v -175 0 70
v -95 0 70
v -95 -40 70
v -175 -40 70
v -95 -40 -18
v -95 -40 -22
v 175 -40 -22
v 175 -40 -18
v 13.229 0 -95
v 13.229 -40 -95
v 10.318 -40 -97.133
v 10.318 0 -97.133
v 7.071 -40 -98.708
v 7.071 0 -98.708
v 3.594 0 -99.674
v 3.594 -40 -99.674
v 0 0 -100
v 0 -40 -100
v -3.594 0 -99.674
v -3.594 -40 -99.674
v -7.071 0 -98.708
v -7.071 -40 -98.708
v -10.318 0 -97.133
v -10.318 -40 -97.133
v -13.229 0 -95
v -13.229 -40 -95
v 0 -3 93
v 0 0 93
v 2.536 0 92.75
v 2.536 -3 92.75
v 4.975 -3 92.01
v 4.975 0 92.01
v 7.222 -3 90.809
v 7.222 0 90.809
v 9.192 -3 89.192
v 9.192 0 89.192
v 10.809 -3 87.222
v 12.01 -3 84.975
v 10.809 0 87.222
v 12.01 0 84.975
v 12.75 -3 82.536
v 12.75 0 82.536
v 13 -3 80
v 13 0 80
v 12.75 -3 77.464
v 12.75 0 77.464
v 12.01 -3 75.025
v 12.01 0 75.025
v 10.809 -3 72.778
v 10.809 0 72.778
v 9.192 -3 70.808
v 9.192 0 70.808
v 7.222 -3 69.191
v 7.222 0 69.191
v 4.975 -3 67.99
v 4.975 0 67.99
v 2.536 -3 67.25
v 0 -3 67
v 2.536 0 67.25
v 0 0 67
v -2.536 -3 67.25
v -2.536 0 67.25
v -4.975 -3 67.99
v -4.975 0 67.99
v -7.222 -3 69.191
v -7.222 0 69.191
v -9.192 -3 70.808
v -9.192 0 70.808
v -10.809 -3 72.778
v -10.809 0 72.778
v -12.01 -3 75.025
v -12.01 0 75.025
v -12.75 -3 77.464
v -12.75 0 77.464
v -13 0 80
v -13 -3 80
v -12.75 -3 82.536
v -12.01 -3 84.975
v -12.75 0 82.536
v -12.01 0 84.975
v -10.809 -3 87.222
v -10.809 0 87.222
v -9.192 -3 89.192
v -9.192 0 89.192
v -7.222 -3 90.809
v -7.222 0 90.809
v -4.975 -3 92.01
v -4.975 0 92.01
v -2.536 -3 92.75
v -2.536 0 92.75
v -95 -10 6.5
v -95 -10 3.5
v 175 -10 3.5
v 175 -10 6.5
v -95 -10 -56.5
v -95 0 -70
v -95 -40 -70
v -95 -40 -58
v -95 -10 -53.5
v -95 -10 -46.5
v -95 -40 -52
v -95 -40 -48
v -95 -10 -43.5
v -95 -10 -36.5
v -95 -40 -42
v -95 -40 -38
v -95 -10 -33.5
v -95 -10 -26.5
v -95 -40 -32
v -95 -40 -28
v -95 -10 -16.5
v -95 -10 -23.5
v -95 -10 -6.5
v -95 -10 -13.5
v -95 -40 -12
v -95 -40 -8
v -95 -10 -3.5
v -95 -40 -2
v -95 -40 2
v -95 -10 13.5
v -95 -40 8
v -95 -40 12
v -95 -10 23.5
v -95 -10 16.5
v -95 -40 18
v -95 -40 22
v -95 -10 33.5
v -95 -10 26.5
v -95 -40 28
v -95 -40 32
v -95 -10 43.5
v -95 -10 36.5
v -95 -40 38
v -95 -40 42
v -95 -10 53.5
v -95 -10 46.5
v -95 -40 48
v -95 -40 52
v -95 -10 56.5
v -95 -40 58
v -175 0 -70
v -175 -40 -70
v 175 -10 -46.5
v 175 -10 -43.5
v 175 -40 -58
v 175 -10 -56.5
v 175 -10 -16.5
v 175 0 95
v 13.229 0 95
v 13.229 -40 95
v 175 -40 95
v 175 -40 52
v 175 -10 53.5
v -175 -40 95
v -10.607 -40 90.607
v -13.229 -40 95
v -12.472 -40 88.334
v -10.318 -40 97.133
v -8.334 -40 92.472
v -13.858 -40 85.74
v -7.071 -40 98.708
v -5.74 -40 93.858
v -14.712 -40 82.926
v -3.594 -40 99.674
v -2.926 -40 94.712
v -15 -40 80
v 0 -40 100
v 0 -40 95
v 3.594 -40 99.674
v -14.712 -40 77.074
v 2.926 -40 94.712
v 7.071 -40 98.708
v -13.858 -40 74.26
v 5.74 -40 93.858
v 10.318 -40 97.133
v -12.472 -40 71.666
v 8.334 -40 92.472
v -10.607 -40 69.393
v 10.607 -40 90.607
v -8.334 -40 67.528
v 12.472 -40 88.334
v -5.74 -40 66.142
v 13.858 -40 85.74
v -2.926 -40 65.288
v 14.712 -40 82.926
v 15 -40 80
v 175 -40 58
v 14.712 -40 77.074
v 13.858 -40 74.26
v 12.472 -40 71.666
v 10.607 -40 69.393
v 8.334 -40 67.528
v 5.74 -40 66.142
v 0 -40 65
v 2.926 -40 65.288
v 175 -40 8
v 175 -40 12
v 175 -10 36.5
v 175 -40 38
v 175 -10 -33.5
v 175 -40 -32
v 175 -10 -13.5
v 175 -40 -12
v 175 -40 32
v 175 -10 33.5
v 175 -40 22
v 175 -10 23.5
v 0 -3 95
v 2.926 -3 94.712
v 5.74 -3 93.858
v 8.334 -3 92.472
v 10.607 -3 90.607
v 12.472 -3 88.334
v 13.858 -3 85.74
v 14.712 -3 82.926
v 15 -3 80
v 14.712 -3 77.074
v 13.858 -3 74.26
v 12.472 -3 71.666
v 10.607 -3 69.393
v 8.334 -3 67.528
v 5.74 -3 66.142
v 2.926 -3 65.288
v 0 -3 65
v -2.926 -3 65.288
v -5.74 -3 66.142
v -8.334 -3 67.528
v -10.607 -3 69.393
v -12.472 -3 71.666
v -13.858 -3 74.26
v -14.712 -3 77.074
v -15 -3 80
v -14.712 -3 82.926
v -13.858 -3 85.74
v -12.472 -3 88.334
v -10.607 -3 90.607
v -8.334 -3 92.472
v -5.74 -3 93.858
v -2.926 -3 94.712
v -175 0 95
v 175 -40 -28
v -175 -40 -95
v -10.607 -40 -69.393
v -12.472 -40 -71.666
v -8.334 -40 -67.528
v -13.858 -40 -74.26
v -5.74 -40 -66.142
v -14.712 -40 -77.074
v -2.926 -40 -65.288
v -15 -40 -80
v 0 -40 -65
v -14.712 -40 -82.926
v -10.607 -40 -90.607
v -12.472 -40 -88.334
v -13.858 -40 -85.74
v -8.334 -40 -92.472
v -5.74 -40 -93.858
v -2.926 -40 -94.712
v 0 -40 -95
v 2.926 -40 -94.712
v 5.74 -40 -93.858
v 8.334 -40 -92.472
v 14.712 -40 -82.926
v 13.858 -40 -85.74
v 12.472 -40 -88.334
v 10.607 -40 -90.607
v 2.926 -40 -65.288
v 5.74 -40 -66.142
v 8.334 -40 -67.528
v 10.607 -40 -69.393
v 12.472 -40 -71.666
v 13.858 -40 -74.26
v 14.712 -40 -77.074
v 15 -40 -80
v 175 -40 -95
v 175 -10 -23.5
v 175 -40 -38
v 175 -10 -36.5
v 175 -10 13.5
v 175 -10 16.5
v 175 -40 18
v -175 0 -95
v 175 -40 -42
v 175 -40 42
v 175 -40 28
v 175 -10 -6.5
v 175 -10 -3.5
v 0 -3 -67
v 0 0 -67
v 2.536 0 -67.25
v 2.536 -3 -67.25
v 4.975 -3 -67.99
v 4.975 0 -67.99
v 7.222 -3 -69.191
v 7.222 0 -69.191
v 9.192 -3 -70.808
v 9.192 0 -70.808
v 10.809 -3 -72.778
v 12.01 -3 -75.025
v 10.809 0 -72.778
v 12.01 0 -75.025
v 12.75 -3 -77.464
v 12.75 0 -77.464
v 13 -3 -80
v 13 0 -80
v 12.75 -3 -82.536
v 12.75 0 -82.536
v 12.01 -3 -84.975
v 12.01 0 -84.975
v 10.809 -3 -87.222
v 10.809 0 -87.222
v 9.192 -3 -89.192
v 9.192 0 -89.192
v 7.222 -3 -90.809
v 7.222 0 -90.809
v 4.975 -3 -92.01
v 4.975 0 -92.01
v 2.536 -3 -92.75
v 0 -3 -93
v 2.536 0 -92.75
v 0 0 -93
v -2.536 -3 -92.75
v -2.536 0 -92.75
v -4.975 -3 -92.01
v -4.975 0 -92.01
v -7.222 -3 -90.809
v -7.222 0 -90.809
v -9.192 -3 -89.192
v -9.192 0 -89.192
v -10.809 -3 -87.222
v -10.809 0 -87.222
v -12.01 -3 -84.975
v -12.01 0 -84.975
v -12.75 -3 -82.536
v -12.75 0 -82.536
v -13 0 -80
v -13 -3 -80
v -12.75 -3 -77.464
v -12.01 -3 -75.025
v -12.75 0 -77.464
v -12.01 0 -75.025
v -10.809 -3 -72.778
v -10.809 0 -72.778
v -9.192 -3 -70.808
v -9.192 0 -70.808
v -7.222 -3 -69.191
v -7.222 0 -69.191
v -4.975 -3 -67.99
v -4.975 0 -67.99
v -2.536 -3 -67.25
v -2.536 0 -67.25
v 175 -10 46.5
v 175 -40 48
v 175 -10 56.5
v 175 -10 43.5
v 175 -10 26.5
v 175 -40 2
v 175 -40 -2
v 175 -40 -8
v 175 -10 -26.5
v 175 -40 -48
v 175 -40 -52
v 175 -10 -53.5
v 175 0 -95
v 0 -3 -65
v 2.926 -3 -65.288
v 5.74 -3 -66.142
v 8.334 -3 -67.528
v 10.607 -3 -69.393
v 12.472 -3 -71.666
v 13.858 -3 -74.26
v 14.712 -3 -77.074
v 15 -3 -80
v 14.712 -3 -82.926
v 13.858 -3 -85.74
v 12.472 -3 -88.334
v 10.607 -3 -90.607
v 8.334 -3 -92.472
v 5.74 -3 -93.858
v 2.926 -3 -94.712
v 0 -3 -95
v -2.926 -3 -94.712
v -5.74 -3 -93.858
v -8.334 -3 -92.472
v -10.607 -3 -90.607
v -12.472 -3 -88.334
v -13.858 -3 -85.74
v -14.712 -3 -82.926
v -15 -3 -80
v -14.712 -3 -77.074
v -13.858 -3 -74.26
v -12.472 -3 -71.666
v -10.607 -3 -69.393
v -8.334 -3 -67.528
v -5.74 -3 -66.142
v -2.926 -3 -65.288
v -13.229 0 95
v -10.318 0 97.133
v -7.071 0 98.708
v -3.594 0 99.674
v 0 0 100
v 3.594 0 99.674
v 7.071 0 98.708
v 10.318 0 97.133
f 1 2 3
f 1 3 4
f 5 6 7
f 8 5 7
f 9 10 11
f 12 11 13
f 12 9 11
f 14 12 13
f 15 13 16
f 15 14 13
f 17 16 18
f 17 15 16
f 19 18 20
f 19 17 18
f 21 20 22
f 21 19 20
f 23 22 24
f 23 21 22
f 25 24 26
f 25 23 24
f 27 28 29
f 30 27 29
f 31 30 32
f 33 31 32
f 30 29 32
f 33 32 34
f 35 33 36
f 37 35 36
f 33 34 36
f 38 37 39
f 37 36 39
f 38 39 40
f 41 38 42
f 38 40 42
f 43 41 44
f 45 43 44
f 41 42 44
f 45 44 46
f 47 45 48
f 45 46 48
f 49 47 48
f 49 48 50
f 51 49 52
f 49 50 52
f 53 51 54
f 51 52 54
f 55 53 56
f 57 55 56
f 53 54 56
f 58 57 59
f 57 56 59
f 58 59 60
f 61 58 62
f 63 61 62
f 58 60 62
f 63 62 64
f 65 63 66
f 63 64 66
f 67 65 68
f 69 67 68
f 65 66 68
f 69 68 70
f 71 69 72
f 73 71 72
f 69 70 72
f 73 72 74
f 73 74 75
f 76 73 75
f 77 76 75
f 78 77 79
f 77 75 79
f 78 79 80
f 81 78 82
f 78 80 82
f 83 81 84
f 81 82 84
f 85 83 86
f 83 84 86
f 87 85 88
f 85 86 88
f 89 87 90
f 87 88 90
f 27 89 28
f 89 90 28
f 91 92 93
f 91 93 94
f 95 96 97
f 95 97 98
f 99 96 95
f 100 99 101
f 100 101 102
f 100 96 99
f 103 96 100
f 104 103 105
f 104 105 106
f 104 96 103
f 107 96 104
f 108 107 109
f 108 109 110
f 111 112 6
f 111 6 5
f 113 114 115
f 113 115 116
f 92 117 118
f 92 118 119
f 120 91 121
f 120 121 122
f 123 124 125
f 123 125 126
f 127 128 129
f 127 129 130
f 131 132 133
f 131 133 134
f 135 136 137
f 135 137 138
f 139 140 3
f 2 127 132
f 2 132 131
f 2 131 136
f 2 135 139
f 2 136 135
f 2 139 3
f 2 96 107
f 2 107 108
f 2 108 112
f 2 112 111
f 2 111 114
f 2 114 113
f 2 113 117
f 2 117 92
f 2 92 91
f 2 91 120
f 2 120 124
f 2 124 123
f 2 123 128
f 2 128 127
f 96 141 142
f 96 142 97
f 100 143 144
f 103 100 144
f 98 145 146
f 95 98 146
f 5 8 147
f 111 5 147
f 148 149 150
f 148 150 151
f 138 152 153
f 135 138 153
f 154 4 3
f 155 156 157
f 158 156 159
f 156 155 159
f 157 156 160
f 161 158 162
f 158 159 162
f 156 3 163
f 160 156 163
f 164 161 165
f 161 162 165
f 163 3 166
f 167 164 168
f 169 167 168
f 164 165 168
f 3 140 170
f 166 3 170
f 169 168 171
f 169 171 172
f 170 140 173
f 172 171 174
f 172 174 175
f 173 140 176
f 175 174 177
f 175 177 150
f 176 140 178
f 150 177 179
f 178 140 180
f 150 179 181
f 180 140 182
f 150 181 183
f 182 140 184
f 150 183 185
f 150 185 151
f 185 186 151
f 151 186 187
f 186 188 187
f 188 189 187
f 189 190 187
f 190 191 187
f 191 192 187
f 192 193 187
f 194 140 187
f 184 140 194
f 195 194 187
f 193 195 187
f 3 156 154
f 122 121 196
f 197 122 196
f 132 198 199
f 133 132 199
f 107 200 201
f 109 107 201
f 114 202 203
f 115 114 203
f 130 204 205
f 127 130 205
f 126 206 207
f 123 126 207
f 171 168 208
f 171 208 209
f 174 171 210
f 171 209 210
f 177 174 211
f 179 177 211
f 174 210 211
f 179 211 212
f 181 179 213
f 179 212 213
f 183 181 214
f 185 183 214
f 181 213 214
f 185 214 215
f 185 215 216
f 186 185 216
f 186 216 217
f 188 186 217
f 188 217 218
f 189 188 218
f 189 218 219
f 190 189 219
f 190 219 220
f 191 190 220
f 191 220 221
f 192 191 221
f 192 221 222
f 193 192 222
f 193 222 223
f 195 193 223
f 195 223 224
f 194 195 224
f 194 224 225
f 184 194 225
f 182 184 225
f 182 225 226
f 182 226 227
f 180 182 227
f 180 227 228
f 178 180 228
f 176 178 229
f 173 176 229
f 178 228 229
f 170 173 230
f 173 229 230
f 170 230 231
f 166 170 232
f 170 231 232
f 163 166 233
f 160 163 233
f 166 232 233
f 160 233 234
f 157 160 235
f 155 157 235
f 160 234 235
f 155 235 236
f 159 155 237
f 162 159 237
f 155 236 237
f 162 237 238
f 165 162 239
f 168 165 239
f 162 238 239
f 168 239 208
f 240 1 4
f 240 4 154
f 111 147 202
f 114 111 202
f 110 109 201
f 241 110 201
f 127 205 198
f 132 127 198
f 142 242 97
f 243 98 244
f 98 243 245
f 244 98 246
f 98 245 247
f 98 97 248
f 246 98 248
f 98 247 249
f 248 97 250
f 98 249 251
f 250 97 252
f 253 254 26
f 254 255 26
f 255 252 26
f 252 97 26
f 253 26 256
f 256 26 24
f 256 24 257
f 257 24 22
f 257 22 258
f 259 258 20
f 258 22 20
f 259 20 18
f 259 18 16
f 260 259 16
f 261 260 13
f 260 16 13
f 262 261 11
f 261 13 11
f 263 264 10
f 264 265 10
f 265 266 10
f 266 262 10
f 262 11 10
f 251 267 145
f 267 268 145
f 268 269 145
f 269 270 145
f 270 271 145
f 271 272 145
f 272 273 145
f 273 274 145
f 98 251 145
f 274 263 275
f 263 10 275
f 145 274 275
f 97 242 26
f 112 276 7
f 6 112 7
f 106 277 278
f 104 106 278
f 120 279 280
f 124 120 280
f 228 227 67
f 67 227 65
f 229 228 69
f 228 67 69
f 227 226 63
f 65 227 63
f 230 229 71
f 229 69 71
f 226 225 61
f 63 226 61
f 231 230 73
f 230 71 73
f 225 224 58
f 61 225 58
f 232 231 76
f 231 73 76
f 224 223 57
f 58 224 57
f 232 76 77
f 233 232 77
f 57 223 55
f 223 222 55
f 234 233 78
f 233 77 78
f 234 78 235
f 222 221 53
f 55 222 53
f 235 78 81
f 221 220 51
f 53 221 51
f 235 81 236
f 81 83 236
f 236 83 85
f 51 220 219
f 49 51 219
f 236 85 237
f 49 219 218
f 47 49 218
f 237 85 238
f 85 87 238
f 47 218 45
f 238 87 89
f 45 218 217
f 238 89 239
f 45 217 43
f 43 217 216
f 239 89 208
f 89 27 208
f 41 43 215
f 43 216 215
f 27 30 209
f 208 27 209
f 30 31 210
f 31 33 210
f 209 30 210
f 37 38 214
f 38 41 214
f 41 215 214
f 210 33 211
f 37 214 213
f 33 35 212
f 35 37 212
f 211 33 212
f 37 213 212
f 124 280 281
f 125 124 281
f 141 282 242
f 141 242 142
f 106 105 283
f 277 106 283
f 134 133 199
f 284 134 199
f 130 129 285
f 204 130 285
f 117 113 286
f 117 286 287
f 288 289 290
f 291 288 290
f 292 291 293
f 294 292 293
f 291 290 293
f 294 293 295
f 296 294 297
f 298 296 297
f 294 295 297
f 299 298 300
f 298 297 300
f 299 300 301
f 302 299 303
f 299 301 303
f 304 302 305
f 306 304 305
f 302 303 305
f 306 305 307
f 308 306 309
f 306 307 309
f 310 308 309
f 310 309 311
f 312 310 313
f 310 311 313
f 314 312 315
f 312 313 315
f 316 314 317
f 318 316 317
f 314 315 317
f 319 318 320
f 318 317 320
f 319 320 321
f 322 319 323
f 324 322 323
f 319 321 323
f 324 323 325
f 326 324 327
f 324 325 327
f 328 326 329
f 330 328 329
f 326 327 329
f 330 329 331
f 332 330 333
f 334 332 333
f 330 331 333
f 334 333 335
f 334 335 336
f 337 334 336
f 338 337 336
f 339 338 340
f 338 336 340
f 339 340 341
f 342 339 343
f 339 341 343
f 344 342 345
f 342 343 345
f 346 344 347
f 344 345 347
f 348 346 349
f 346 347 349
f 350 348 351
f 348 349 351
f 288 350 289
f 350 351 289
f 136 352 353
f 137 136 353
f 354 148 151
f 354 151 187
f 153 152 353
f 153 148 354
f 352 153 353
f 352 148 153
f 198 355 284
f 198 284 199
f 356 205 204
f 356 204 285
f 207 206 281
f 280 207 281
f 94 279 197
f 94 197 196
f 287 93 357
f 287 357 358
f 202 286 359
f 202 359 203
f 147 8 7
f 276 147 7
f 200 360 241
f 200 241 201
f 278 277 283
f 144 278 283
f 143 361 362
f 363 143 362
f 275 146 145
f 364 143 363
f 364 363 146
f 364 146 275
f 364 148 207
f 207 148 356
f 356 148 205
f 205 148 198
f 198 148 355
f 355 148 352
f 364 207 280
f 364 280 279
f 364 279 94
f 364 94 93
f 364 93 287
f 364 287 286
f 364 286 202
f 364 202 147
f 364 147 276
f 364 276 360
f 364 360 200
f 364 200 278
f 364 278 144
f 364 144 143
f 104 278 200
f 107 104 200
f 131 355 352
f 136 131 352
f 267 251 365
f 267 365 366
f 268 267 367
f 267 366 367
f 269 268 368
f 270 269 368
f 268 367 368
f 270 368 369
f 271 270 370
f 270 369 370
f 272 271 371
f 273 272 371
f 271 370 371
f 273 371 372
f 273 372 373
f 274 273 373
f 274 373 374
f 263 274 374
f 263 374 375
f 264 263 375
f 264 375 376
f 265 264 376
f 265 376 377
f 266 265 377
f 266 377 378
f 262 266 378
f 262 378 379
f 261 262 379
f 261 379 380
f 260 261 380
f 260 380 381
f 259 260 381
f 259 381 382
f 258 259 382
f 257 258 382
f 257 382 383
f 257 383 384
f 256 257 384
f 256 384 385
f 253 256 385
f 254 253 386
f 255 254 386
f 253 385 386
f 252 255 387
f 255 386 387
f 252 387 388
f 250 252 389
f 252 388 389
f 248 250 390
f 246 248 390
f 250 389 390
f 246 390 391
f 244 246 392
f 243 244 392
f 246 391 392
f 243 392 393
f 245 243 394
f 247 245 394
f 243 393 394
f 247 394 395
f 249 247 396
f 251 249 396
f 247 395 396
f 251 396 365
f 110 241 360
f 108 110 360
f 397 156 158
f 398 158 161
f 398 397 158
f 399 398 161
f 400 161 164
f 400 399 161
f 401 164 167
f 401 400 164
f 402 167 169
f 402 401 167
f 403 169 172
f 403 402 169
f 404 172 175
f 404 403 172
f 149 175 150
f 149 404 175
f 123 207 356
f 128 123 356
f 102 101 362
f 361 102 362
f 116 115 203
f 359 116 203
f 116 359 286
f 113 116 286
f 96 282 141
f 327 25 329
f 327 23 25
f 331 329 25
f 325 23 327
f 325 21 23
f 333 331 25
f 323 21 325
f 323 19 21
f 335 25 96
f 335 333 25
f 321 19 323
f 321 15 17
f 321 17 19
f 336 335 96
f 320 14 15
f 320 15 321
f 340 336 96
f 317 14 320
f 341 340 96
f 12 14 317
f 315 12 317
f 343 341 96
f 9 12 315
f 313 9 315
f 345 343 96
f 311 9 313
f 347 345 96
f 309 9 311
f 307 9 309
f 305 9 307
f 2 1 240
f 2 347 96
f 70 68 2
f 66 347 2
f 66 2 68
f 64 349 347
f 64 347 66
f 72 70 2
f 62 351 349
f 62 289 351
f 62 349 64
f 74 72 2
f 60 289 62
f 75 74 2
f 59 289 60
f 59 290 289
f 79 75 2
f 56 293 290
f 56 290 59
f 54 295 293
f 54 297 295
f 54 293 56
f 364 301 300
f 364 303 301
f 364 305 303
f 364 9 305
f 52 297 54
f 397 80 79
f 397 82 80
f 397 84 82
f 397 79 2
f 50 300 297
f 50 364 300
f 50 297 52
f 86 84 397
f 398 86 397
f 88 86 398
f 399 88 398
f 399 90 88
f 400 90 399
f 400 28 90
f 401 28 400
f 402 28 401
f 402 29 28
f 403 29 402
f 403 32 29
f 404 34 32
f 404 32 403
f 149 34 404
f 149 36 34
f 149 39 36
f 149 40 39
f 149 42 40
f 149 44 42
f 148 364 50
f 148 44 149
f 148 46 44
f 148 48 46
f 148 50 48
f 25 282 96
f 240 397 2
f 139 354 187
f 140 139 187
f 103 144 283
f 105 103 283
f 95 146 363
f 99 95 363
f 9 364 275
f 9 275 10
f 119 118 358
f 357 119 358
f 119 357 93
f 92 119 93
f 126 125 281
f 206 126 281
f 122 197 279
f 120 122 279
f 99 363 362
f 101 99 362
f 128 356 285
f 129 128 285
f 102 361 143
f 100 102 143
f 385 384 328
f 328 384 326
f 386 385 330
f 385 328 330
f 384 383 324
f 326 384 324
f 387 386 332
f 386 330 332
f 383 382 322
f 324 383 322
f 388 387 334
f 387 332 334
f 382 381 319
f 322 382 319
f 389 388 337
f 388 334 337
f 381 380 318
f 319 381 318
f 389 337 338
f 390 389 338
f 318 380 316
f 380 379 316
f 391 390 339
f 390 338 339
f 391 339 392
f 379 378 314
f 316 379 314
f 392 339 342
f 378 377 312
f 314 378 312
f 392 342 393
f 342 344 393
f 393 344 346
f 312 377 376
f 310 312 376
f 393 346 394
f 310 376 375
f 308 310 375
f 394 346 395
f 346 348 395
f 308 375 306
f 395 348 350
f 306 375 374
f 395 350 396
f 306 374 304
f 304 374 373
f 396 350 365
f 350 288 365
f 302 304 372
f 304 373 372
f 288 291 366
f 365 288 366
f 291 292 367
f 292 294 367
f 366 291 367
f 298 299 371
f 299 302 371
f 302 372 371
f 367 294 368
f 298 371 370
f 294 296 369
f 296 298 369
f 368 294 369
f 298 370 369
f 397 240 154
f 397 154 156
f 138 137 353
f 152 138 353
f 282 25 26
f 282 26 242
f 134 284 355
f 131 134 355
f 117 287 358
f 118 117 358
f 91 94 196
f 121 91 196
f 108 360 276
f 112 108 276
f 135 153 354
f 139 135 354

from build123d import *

# Parameters (mm, degrees)
SKETCH1_R           = 15
BOSS_EXTRUDE2_DEPTH = 40
SKETCH1_4_R         = 15
SKETCH1_4_R_2       = 13
BOSS_EXTRUDE3_DEPTH = 3
CUT_EXTRUDE1_DEPTH  = 291.688837075


with BuildPart() as part:
    # Sketch1 → Boss-Extrude2 (new body)
    with BuildSketch(Plane(origin=(0, 0, 0), x_dir=(1, 0, 0), z_dir=(0, 1, 0))):
        with BuildLine():
            Line((-13.228756555, 95), (-175, 95))
            Line((-175, 95), (-175, 70))
            Line((-175, 70), (-95, 70))
            Line((-95, 70), (-95, -70))
            Line((-95, -70), (-175, -70))
            Line((-175, -70), (-175, -95))
            Line((-175, -95), (-13.228756555, -95))
            ThreePointArc((-13.228756555, -95), (0, -100), (13.228756555, -95))
            Line((13.228756555, -95), (175, -95))
            Line((175, -95), (175, 95))
            Line((175, 95), (13.228756555, 95))
            ThreePointArc((13.228756555, 95), (0, 100), (-13.228756555, 95))
        make_face()
        with Locations((0, -80)):
            Circle(SKETCH1_R, mode=Mode.SUBTRACT)
        with Locations((0, 80)):
            Circle(SKETCH1_R, mode=Mode.SUBTRACT)
    extrude(amount=-BOSS_EXTRUDE2_DEPTH)

    # Sketch1<4> → Boss-Extrude3 (add)
    # profile 1 of 2: a face of its own
    with BuildSketch(Plane(origin=(0, 0, 0), x_dir=(1, 0, 0), z_dir=(0, 1, 0))):
        with Locations((0, 80)):
            Circle(SKETCH1_4_R)
        with Locations((0, 80)):
            Circle(SKETCH1_4_R_2, mode=Mode.SUBTRACT)
    # profile 2 of 2: a face of its own
    with BuildSketch(Plane(origin=(0, 0, 0), x_dir=(1, 0, 0), z_dir=(0, 1, 0))):
        with Locations((0, -80)):
            Circle(SKETCH1_4_R)
        with Locations((0, -80)):
            Circle(SKETCH1_4_R_2, mode=Mode.SUBTRACT)
    extrude(amount=-BOSS_EXTRUDE3_DEPTH)

    # Sketch3 → Cut-Extrude1 (cut, through all)
    with BuildSketch(Plane.ZY.offset(95)):
        Polygon((-58, -40), (-56.5, -10), (-53.5, -10), (-52, -40), align=None)
        Polygon((-48, -40), (-46.5, -10), (-43.5, -10), (-42, -40), align=None)
        Polygon((-38, -40), (-36.5, -10), (-33.5, -10), (-32, -40), align=None)
        Polygon((-28, -40), (-26.5, -10), (-23.5, -10), (-22, -40), align=None)
        Polygon((-18, -40), (-16.5, -10), (-13.5, -10), (-12, -40), align=None)
        Polygon((-8, -40), (-6.5, -10), (-3.5, -10), (-2, -40), align=None)
        Polygon((2, -40), (3.5, -10), (6.5, -10), (8, -40), align=None)
        Polygon((12, -40), (13.5, -10), (16.5, -10), (18, -40), align=None)
        Polygon((22, -40), (23.5, -10), (26.5, -10), (28, -40), align=None)
        Polygon((32, -40), (33.5, -10), (36.5, -10), (38, -40), align=None)
        Polygon((42, -40), (43.5, -10), (46.5, -10), (48, -40), align=None)
        Polygon((52, -40), (53.5, -10), (56.5, -10), (58, -40), align=None)
    extrude(amount=-CUT_EXTRUDE1_DEPTH, mode=Mode.SUBTRACT)


solid = part.part
